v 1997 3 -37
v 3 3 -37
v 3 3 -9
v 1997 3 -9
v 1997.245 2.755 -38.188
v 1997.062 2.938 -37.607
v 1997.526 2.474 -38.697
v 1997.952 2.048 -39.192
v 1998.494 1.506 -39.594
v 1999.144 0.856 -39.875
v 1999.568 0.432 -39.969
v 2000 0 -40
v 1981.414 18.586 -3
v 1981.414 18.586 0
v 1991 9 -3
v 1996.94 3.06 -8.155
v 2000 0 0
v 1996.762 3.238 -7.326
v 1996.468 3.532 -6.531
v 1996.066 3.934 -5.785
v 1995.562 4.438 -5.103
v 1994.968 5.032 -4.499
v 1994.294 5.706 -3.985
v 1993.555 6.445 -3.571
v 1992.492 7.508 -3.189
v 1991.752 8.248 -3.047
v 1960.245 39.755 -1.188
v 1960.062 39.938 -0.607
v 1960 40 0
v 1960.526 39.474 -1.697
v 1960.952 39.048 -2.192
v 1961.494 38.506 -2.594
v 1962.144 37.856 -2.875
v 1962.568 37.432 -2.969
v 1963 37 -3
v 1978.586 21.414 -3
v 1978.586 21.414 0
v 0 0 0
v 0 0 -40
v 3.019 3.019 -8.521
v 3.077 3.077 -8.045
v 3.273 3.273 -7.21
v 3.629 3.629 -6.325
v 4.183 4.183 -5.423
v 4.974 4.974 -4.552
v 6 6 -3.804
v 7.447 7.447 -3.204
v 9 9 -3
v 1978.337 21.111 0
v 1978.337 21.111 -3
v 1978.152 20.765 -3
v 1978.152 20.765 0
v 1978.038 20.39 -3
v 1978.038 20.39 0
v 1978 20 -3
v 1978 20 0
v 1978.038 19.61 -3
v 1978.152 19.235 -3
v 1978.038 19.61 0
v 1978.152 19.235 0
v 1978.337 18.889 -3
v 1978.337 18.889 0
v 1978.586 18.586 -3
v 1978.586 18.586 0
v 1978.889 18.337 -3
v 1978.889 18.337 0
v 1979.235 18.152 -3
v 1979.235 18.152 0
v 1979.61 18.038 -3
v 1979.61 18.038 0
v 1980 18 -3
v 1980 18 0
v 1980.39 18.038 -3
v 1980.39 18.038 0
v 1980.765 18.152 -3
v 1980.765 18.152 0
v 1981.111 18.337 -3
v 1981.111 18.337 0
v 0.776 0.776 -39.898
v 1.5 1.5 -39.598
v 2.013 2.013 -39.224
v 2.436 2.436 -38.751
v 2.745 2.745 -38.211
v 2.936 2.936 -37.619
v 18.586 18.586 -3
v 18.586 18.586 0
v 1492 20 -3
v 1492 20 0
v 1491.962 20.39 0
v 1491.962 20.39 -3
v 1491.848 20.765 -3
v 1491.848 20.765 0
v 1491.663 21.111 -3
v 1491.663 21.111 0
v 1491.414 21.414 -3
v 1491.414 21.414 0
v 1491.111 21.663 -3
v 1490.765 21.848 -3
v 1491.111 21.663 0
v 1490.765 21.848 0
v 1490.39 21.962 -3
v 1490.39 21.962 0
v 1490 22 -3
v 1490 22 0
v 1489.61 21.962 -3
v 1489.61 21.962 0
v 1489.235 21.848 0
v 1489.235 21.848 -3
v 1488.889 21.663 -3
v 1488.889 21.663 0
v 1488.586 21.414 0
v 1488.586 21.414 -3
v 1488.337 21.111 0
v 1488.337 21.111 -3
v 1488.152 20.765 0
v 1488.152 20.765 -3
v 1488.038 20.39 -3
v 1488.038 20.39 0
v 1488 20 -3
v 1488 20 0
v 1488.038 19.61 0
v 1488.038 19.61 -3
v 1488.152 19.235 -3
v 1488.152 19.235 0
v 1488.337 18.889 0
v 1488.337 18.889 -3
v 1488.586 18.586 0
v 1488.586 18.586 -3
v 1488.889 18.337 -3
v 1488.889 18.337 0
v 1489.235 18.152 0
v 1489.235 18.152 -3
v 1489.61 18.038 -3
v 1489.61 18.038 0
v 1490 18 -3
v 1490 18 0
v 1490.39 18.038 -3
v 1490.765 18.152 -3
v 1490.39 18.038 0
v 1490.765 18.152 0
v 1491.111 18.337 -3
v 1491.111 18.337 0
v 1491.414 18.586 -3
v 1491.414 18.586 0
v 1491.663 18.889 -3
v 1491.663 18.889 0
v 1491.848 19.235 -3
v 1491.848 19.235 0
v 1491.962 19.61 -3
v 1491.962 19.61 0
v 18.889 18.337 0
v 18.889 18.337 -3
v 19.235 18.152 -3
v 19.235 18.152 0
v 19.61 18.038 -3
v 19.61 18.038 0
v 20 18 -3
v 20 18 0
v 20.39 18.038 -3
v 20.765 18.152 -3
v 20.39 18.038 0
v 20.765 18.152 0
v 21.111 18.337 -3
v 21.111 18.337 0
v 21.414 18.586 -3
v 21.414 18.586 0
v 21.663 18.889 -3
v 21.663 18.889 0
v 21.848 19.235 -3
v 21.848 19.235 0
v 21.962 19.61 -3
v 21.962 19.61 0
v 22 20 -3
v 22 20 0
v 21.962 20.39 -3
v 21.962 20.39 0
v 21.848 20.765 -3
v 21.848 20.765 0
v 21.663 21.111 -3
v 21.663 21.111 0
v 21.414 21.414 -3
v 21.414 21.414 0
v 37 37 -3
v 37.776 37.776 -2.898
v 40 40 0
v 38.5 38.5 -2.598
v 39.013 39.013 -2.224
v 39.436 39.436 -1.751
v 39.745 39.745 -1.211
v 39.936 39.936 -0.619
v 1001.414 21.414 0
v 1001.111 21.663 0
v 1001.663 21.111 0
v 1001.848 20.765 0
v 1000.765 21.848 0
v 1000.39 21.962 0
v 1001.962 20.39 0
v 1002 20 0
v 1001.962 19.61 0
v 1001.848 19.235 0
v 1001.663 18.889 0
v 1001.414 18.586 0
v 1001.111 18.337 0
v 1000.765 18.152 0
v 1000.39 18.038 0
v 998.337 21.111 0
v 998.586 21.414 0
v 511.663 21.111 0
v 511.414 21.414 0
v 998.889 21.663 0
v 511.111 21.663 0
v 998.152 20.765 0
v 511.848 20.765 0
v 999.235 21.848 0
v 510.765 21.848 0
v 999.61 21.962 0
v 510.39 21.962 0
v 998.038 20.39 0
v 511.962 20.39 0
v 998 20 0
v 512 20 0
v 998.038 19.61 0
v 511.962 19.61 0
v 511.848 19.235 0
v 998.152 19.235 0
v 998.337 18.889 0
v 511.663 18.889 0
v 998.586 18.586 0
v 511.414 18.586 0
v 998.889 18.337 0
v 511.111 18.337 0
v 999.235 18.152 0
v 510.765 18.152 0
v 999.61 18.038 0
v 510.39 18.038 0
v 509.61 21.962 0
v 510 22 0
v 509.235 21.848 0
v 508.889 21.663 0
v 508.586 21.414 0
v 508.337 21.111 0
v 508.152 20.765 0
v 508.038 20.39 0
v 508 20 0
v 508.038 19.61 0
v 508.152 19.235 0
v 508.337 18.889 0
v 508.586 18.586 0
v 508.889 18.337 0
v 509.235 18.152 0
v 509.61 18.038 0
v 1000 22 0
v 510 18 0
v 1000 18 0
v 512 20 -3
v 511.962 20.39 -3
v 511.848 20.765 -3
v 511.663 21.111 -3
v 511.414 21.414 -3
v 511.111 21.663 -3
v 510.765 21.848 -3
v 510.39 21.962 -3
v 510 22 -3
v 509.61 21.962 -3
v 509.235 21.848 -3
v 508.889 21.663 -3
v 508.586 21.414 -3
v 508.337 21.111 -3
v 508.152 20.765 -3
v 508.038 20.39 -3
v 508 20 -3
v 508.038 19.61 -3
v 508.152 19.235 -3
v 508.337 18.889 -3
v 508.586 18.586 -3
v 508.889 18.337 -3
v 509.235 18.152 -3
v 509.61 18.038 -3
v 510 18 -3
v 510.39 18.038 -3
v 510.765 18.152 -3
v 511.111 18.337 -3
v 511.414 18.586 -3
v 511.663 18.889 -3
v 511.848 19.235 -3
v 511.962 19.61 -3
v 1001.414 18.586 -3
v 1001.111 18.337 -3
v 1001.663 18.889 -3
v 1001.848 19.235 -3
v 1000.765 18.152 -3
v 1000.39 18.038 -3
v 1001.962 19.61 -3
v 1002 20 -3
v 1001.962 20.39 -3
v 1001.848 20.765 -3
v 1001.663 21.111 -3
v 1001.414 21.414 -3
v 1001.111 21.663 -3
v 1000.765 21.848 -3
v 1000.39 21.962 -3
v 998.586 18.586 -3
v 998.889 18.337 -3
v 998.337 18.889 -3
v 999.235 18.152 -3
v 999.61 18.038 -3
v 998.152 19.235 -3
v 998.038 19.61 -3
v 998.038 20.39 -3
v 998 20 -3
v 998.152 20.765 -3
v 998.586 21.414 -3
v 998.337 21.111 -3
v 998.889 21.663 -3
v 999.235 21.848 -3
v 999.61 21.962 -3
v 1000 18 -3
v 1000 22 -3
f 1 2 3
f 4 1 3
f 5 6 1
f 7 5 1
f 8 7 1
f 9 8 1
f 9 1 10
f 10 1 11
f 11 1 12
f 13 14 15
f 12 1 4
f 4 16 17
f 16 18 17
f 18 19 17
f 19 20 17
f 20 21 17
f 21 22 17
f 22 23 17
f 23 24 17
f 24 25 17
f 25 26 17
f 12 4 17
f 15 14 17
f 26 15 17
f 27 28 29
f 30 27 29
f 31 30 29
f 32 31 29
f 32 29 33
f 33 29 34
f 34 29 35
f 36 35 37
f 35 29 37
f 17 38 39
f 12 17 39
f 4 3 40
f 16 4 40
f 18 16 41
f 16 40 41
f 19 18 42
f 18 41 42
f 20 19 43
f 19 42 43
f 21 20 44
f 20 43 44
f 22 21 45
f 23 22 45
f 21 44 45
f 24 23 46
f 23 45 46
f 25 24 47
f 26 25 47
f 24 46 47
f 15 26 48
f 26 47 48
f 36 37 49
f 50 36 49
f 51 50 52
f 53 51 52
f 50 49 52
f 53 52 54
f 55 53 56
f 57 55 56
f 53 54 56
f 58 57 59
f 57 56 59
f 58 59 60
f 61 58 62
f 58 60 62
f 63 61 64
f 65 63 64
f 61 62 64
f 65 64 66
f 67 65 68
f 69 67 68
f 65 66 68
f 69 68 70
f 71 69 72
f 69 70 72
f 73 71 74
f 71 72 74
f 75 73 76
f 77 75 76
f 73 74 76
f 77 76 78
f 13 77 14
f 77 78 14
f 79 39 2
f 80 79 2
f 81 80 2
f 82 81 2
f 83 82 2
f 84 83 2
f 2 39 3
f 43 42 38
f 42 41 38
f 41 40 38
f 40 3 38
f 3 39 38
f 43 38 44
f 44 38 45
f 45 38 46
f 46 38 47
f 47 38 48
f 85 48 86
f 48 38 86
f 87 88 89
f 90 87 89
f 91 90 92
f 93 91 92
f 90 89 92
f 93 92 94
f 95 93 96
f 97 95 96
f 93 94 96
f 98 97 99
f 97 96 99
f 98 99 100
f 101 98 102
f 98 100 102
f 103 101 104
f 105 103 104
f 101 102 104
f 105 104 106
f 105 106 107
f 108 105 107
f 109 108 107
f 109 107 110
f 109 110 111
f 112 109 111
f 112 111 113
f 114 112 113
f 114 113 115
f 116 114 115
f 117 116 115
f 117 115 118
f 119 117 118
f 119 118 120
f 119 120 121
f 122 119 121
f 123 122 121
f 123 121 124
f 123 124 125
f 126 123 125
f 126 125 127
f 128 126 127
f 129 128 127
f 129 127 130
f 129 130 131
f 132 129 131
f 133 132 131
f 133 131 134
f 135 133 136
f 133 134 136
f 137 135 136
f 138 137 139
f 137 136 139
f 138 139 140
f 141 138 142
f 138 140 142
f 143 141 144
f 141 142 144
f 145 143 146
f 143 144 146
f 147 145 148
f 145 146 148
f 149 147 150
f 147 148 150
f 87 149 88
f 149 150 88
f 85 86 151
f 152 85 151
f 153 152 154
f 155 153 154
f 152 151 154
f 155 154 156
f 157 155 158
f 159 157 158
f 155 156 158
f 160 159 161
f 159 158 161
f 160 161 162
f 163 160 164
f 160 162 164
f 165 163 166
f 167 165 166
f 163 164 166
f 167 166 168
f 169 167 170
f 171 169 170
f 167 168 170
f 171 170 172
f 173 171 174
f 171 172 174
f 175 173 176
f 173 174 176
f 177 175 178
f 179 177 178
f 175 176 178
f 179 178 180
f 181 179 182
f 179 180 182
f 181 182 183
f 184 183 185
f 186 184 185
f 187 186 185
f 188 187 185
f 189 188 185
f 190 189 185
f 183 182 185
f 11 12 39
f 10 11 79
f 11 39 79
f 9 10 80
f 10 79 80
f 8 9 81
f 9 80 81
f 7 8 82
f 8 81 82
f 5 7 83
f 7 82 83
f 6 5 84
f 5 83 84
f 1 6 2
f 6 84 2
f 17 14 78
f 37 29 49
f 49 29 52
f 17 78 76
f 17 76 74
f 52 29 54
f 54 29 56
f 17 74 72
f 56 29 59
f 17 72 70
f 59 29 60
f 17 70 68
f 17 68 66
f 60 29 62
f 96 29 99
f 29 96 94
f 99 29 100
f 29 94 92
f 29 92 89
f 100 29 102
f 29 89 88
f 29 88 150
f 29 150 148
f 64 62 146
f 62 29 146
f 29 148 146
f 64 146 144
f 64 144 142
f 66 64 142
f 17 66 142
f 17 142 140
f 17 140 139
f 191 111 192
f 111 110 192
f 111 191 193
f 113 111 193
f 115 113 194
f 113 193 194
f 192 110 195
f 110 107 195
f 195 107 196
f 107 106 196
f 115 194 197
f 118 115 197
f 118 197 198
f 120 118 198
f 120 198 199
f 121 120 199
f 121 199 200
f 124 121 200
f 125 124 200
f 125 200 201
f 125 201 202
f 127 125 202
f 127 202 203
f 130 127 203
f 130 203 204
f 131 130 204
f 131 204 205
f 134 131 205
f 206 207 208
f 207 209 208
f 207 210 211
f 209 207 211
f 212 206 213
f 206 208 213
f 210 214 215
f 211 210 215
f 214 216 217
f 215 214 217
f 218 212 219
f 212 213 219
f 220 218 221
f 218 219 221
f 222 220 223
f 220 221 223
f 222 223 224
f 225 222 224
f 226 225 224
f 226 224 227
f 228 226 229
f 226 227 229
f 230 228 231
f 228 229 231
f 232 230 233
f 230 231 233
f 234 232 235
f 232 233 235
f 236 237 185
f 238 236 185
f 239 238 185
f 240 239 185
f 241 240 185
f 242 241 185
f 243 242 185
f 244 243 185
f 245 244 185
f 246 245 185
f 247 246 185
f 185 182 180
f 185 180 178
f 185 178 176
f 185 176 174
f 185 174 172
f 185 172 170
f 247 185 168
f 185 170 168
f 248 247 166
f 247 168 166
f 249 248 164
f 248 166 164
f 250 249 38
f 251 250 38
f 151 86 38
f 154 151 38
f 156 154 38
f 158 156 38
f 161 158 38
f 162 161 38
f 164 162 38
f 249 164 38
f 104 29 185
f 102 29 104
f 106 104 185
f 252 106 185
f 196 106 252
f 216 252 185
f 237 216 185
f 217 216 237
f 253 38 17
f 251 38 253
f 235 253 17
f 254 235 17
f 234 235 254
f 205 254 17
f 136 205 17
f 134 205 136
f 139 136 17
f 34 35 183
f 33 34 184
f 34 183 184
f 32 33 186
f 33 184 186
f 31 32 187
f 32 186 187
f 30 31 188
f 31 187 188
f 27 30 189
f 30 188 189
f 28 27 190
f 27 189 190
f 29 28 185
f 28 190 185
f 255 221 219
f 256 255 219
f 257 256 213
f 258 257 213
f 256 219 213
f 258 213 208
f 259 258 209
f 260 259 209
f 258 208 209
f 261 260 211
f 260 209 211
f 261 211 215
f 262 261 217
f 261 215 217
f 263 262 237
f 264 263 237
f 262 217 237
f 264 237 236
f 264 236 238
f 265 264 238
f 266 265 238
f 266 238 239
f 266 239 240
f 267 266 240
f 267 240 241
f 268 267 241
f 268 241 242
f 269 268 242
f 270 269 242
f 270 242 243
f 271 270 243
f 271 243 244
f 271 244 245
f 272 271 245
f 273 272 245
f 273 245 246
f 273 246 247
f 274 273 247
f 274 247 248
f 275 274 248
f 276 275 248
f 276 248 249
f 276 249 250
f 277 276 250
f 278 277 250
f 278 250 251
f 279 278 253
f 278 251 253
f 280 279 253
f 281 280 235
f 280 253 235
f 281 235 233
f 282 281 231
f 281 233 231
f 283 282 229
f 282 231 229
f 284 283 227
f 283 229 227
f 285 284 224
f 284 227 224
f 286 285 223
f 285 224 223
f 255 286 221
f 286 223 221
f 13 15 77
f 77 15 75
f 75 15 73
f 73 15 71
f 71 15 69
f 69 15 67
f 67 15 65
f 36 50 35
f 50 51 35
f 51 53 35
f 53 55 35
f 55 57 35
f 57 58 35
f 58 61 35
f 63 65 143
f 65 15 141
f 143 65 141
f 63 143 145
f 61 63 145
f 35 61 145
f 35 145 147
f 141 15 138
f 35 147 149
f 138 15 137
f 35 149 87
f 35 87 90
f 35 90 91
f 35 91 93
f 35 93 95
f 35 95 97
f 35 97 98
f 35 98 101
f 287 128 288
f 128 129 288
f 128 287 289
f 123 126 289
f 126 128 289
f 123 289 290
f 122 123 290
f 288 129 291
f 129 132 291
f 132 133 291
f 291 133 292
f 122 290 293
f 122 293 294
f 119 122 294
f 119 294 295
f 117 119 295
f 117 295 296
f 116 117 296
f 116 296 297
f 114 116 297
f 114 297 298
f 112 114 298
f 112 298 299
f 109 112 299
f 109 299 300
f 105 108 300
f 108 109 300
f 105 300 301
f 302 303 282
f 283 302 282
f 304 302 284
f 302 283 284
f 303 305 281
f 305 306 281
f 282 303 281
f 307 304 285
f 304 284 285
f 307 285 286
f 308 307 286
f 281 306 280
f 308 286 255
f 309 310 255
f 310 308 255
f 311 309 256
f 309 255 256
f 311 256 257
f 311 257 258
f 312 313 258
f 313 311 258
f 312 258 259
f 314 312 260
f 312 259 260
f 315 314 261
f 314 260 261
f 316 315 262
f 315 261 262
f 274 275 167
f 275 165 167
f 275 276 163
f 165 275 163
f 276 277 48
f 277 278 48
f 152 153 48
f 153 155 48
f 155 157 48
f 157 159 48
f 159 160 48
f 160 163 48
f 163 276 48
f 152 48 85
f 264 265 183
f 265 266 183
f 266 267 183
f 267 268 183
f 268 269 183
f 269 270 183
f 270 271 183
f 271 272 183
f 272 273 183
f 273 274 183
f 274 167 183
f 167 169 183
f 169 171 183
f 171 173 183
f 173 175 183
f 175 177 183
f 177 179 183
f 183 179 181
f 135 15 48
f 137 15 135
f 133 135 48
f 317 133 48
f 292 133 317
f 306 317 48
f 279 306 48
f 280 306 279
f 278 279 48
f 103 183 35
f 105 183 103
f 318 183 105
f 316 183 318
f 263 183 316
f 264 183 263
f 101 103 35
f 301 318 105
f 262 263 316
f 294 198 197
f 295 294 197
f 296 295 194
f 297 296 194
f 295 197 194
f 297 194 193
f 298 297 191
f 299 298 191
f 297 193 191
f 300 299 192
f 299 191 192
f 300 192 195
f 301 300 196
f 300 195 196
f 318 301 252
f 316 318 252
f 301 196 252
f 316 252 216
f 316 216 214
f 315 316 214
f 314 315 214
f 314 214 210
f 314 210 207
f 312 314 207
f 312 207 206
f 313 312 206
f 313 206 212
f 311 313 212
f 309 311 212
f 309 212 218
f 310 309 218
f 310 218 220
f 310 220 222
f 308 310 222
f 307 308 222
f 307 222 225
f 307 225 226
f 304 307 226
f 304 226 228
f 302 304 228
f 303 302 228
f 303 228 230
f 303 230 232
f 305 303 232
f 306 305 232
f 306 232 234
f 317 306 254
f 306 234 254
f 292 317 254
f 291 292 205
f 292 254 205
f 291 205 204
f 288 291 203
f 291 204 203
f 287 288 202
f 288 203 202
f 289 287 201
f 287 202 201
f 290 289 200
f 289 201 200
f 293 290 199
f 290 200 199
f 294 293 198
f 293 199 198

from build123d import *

# Parameters (mm, degrees)
L_ANGLE_EQUAL_40X40X3_4_DEPTH = 2000
SKETCH14_R                    = 2
CUT_EXTRUDE1_DEPTH            = 2001.799840064


with BuildPart() as part:
    # Sketch13 → L angle (equal) 40X40X3(4) (new body)
    with BuildSketch(Plane(origin=(0, 0, 0), x_dir=(0, 0, -1), z_dir=(1, 0, 0))):
        with BuildLine():
            Line((0, 40), (0, 0))
            Line((0, 0), (40, 0))
            ThreePointArc((40, 0), (39.121320344, 2.121320344), (37, 3))
            Line((37, 3), (9, 3))
            ThreePointArc((9, 3), (4.757359313, 4.757359313), (3, 9))
            Line((3, 9), (3, 37))
            ThreePointArc((3, 37), (2.121320344, 39.121320344), (0, 40))
        make_face()
    extrude(amount=L_ANGLE_EQUAL_40X40X3_4_DEPTH)

    # Sketch14 → Cut-Extrude1 (cut, through all)
    with BuildSketch(Plane.XY):
        with Locations((1000, 20)):
            Circle(SKETCH14_R)
        with Locations((510, 20)):
            Circle(SKETCH14_R)
        with Locations((1490, 20)):
            Circle(SKETCH14_R)
        with BuildLine():
            Line((2000, 0), (2000, 40))
            Line((2000, 40), (1960, 40))
            Line((1960, 40), (1978.585786438, 21.414213562))
            ThreePointArc((1978.585786438, 21.414213562), (1978.585786438, 18.585786438), (1981.414213562, 18.585786438))
            Line((1981.414213562, 18.585786438), (2000, 0))
        make_face()
        with BuildLine():
            Line((0, 40), (0, 0))
            Line((0, 0), (18.585786438, 18.585786438))
            ThreePointArc((18.585786438, 18.585786438), (21.414213562, 18.585786438), (21.414213562, 21.414213562))
            Line((21.414213562, 21.414213562), (40, 40))
            Line((40, 40), (0, 40))
        make_face()
    extrude(amount=-CUT_EXTRUDE1_DEPTH, mode=Mode.SUBTRACT)


solid = part.part
